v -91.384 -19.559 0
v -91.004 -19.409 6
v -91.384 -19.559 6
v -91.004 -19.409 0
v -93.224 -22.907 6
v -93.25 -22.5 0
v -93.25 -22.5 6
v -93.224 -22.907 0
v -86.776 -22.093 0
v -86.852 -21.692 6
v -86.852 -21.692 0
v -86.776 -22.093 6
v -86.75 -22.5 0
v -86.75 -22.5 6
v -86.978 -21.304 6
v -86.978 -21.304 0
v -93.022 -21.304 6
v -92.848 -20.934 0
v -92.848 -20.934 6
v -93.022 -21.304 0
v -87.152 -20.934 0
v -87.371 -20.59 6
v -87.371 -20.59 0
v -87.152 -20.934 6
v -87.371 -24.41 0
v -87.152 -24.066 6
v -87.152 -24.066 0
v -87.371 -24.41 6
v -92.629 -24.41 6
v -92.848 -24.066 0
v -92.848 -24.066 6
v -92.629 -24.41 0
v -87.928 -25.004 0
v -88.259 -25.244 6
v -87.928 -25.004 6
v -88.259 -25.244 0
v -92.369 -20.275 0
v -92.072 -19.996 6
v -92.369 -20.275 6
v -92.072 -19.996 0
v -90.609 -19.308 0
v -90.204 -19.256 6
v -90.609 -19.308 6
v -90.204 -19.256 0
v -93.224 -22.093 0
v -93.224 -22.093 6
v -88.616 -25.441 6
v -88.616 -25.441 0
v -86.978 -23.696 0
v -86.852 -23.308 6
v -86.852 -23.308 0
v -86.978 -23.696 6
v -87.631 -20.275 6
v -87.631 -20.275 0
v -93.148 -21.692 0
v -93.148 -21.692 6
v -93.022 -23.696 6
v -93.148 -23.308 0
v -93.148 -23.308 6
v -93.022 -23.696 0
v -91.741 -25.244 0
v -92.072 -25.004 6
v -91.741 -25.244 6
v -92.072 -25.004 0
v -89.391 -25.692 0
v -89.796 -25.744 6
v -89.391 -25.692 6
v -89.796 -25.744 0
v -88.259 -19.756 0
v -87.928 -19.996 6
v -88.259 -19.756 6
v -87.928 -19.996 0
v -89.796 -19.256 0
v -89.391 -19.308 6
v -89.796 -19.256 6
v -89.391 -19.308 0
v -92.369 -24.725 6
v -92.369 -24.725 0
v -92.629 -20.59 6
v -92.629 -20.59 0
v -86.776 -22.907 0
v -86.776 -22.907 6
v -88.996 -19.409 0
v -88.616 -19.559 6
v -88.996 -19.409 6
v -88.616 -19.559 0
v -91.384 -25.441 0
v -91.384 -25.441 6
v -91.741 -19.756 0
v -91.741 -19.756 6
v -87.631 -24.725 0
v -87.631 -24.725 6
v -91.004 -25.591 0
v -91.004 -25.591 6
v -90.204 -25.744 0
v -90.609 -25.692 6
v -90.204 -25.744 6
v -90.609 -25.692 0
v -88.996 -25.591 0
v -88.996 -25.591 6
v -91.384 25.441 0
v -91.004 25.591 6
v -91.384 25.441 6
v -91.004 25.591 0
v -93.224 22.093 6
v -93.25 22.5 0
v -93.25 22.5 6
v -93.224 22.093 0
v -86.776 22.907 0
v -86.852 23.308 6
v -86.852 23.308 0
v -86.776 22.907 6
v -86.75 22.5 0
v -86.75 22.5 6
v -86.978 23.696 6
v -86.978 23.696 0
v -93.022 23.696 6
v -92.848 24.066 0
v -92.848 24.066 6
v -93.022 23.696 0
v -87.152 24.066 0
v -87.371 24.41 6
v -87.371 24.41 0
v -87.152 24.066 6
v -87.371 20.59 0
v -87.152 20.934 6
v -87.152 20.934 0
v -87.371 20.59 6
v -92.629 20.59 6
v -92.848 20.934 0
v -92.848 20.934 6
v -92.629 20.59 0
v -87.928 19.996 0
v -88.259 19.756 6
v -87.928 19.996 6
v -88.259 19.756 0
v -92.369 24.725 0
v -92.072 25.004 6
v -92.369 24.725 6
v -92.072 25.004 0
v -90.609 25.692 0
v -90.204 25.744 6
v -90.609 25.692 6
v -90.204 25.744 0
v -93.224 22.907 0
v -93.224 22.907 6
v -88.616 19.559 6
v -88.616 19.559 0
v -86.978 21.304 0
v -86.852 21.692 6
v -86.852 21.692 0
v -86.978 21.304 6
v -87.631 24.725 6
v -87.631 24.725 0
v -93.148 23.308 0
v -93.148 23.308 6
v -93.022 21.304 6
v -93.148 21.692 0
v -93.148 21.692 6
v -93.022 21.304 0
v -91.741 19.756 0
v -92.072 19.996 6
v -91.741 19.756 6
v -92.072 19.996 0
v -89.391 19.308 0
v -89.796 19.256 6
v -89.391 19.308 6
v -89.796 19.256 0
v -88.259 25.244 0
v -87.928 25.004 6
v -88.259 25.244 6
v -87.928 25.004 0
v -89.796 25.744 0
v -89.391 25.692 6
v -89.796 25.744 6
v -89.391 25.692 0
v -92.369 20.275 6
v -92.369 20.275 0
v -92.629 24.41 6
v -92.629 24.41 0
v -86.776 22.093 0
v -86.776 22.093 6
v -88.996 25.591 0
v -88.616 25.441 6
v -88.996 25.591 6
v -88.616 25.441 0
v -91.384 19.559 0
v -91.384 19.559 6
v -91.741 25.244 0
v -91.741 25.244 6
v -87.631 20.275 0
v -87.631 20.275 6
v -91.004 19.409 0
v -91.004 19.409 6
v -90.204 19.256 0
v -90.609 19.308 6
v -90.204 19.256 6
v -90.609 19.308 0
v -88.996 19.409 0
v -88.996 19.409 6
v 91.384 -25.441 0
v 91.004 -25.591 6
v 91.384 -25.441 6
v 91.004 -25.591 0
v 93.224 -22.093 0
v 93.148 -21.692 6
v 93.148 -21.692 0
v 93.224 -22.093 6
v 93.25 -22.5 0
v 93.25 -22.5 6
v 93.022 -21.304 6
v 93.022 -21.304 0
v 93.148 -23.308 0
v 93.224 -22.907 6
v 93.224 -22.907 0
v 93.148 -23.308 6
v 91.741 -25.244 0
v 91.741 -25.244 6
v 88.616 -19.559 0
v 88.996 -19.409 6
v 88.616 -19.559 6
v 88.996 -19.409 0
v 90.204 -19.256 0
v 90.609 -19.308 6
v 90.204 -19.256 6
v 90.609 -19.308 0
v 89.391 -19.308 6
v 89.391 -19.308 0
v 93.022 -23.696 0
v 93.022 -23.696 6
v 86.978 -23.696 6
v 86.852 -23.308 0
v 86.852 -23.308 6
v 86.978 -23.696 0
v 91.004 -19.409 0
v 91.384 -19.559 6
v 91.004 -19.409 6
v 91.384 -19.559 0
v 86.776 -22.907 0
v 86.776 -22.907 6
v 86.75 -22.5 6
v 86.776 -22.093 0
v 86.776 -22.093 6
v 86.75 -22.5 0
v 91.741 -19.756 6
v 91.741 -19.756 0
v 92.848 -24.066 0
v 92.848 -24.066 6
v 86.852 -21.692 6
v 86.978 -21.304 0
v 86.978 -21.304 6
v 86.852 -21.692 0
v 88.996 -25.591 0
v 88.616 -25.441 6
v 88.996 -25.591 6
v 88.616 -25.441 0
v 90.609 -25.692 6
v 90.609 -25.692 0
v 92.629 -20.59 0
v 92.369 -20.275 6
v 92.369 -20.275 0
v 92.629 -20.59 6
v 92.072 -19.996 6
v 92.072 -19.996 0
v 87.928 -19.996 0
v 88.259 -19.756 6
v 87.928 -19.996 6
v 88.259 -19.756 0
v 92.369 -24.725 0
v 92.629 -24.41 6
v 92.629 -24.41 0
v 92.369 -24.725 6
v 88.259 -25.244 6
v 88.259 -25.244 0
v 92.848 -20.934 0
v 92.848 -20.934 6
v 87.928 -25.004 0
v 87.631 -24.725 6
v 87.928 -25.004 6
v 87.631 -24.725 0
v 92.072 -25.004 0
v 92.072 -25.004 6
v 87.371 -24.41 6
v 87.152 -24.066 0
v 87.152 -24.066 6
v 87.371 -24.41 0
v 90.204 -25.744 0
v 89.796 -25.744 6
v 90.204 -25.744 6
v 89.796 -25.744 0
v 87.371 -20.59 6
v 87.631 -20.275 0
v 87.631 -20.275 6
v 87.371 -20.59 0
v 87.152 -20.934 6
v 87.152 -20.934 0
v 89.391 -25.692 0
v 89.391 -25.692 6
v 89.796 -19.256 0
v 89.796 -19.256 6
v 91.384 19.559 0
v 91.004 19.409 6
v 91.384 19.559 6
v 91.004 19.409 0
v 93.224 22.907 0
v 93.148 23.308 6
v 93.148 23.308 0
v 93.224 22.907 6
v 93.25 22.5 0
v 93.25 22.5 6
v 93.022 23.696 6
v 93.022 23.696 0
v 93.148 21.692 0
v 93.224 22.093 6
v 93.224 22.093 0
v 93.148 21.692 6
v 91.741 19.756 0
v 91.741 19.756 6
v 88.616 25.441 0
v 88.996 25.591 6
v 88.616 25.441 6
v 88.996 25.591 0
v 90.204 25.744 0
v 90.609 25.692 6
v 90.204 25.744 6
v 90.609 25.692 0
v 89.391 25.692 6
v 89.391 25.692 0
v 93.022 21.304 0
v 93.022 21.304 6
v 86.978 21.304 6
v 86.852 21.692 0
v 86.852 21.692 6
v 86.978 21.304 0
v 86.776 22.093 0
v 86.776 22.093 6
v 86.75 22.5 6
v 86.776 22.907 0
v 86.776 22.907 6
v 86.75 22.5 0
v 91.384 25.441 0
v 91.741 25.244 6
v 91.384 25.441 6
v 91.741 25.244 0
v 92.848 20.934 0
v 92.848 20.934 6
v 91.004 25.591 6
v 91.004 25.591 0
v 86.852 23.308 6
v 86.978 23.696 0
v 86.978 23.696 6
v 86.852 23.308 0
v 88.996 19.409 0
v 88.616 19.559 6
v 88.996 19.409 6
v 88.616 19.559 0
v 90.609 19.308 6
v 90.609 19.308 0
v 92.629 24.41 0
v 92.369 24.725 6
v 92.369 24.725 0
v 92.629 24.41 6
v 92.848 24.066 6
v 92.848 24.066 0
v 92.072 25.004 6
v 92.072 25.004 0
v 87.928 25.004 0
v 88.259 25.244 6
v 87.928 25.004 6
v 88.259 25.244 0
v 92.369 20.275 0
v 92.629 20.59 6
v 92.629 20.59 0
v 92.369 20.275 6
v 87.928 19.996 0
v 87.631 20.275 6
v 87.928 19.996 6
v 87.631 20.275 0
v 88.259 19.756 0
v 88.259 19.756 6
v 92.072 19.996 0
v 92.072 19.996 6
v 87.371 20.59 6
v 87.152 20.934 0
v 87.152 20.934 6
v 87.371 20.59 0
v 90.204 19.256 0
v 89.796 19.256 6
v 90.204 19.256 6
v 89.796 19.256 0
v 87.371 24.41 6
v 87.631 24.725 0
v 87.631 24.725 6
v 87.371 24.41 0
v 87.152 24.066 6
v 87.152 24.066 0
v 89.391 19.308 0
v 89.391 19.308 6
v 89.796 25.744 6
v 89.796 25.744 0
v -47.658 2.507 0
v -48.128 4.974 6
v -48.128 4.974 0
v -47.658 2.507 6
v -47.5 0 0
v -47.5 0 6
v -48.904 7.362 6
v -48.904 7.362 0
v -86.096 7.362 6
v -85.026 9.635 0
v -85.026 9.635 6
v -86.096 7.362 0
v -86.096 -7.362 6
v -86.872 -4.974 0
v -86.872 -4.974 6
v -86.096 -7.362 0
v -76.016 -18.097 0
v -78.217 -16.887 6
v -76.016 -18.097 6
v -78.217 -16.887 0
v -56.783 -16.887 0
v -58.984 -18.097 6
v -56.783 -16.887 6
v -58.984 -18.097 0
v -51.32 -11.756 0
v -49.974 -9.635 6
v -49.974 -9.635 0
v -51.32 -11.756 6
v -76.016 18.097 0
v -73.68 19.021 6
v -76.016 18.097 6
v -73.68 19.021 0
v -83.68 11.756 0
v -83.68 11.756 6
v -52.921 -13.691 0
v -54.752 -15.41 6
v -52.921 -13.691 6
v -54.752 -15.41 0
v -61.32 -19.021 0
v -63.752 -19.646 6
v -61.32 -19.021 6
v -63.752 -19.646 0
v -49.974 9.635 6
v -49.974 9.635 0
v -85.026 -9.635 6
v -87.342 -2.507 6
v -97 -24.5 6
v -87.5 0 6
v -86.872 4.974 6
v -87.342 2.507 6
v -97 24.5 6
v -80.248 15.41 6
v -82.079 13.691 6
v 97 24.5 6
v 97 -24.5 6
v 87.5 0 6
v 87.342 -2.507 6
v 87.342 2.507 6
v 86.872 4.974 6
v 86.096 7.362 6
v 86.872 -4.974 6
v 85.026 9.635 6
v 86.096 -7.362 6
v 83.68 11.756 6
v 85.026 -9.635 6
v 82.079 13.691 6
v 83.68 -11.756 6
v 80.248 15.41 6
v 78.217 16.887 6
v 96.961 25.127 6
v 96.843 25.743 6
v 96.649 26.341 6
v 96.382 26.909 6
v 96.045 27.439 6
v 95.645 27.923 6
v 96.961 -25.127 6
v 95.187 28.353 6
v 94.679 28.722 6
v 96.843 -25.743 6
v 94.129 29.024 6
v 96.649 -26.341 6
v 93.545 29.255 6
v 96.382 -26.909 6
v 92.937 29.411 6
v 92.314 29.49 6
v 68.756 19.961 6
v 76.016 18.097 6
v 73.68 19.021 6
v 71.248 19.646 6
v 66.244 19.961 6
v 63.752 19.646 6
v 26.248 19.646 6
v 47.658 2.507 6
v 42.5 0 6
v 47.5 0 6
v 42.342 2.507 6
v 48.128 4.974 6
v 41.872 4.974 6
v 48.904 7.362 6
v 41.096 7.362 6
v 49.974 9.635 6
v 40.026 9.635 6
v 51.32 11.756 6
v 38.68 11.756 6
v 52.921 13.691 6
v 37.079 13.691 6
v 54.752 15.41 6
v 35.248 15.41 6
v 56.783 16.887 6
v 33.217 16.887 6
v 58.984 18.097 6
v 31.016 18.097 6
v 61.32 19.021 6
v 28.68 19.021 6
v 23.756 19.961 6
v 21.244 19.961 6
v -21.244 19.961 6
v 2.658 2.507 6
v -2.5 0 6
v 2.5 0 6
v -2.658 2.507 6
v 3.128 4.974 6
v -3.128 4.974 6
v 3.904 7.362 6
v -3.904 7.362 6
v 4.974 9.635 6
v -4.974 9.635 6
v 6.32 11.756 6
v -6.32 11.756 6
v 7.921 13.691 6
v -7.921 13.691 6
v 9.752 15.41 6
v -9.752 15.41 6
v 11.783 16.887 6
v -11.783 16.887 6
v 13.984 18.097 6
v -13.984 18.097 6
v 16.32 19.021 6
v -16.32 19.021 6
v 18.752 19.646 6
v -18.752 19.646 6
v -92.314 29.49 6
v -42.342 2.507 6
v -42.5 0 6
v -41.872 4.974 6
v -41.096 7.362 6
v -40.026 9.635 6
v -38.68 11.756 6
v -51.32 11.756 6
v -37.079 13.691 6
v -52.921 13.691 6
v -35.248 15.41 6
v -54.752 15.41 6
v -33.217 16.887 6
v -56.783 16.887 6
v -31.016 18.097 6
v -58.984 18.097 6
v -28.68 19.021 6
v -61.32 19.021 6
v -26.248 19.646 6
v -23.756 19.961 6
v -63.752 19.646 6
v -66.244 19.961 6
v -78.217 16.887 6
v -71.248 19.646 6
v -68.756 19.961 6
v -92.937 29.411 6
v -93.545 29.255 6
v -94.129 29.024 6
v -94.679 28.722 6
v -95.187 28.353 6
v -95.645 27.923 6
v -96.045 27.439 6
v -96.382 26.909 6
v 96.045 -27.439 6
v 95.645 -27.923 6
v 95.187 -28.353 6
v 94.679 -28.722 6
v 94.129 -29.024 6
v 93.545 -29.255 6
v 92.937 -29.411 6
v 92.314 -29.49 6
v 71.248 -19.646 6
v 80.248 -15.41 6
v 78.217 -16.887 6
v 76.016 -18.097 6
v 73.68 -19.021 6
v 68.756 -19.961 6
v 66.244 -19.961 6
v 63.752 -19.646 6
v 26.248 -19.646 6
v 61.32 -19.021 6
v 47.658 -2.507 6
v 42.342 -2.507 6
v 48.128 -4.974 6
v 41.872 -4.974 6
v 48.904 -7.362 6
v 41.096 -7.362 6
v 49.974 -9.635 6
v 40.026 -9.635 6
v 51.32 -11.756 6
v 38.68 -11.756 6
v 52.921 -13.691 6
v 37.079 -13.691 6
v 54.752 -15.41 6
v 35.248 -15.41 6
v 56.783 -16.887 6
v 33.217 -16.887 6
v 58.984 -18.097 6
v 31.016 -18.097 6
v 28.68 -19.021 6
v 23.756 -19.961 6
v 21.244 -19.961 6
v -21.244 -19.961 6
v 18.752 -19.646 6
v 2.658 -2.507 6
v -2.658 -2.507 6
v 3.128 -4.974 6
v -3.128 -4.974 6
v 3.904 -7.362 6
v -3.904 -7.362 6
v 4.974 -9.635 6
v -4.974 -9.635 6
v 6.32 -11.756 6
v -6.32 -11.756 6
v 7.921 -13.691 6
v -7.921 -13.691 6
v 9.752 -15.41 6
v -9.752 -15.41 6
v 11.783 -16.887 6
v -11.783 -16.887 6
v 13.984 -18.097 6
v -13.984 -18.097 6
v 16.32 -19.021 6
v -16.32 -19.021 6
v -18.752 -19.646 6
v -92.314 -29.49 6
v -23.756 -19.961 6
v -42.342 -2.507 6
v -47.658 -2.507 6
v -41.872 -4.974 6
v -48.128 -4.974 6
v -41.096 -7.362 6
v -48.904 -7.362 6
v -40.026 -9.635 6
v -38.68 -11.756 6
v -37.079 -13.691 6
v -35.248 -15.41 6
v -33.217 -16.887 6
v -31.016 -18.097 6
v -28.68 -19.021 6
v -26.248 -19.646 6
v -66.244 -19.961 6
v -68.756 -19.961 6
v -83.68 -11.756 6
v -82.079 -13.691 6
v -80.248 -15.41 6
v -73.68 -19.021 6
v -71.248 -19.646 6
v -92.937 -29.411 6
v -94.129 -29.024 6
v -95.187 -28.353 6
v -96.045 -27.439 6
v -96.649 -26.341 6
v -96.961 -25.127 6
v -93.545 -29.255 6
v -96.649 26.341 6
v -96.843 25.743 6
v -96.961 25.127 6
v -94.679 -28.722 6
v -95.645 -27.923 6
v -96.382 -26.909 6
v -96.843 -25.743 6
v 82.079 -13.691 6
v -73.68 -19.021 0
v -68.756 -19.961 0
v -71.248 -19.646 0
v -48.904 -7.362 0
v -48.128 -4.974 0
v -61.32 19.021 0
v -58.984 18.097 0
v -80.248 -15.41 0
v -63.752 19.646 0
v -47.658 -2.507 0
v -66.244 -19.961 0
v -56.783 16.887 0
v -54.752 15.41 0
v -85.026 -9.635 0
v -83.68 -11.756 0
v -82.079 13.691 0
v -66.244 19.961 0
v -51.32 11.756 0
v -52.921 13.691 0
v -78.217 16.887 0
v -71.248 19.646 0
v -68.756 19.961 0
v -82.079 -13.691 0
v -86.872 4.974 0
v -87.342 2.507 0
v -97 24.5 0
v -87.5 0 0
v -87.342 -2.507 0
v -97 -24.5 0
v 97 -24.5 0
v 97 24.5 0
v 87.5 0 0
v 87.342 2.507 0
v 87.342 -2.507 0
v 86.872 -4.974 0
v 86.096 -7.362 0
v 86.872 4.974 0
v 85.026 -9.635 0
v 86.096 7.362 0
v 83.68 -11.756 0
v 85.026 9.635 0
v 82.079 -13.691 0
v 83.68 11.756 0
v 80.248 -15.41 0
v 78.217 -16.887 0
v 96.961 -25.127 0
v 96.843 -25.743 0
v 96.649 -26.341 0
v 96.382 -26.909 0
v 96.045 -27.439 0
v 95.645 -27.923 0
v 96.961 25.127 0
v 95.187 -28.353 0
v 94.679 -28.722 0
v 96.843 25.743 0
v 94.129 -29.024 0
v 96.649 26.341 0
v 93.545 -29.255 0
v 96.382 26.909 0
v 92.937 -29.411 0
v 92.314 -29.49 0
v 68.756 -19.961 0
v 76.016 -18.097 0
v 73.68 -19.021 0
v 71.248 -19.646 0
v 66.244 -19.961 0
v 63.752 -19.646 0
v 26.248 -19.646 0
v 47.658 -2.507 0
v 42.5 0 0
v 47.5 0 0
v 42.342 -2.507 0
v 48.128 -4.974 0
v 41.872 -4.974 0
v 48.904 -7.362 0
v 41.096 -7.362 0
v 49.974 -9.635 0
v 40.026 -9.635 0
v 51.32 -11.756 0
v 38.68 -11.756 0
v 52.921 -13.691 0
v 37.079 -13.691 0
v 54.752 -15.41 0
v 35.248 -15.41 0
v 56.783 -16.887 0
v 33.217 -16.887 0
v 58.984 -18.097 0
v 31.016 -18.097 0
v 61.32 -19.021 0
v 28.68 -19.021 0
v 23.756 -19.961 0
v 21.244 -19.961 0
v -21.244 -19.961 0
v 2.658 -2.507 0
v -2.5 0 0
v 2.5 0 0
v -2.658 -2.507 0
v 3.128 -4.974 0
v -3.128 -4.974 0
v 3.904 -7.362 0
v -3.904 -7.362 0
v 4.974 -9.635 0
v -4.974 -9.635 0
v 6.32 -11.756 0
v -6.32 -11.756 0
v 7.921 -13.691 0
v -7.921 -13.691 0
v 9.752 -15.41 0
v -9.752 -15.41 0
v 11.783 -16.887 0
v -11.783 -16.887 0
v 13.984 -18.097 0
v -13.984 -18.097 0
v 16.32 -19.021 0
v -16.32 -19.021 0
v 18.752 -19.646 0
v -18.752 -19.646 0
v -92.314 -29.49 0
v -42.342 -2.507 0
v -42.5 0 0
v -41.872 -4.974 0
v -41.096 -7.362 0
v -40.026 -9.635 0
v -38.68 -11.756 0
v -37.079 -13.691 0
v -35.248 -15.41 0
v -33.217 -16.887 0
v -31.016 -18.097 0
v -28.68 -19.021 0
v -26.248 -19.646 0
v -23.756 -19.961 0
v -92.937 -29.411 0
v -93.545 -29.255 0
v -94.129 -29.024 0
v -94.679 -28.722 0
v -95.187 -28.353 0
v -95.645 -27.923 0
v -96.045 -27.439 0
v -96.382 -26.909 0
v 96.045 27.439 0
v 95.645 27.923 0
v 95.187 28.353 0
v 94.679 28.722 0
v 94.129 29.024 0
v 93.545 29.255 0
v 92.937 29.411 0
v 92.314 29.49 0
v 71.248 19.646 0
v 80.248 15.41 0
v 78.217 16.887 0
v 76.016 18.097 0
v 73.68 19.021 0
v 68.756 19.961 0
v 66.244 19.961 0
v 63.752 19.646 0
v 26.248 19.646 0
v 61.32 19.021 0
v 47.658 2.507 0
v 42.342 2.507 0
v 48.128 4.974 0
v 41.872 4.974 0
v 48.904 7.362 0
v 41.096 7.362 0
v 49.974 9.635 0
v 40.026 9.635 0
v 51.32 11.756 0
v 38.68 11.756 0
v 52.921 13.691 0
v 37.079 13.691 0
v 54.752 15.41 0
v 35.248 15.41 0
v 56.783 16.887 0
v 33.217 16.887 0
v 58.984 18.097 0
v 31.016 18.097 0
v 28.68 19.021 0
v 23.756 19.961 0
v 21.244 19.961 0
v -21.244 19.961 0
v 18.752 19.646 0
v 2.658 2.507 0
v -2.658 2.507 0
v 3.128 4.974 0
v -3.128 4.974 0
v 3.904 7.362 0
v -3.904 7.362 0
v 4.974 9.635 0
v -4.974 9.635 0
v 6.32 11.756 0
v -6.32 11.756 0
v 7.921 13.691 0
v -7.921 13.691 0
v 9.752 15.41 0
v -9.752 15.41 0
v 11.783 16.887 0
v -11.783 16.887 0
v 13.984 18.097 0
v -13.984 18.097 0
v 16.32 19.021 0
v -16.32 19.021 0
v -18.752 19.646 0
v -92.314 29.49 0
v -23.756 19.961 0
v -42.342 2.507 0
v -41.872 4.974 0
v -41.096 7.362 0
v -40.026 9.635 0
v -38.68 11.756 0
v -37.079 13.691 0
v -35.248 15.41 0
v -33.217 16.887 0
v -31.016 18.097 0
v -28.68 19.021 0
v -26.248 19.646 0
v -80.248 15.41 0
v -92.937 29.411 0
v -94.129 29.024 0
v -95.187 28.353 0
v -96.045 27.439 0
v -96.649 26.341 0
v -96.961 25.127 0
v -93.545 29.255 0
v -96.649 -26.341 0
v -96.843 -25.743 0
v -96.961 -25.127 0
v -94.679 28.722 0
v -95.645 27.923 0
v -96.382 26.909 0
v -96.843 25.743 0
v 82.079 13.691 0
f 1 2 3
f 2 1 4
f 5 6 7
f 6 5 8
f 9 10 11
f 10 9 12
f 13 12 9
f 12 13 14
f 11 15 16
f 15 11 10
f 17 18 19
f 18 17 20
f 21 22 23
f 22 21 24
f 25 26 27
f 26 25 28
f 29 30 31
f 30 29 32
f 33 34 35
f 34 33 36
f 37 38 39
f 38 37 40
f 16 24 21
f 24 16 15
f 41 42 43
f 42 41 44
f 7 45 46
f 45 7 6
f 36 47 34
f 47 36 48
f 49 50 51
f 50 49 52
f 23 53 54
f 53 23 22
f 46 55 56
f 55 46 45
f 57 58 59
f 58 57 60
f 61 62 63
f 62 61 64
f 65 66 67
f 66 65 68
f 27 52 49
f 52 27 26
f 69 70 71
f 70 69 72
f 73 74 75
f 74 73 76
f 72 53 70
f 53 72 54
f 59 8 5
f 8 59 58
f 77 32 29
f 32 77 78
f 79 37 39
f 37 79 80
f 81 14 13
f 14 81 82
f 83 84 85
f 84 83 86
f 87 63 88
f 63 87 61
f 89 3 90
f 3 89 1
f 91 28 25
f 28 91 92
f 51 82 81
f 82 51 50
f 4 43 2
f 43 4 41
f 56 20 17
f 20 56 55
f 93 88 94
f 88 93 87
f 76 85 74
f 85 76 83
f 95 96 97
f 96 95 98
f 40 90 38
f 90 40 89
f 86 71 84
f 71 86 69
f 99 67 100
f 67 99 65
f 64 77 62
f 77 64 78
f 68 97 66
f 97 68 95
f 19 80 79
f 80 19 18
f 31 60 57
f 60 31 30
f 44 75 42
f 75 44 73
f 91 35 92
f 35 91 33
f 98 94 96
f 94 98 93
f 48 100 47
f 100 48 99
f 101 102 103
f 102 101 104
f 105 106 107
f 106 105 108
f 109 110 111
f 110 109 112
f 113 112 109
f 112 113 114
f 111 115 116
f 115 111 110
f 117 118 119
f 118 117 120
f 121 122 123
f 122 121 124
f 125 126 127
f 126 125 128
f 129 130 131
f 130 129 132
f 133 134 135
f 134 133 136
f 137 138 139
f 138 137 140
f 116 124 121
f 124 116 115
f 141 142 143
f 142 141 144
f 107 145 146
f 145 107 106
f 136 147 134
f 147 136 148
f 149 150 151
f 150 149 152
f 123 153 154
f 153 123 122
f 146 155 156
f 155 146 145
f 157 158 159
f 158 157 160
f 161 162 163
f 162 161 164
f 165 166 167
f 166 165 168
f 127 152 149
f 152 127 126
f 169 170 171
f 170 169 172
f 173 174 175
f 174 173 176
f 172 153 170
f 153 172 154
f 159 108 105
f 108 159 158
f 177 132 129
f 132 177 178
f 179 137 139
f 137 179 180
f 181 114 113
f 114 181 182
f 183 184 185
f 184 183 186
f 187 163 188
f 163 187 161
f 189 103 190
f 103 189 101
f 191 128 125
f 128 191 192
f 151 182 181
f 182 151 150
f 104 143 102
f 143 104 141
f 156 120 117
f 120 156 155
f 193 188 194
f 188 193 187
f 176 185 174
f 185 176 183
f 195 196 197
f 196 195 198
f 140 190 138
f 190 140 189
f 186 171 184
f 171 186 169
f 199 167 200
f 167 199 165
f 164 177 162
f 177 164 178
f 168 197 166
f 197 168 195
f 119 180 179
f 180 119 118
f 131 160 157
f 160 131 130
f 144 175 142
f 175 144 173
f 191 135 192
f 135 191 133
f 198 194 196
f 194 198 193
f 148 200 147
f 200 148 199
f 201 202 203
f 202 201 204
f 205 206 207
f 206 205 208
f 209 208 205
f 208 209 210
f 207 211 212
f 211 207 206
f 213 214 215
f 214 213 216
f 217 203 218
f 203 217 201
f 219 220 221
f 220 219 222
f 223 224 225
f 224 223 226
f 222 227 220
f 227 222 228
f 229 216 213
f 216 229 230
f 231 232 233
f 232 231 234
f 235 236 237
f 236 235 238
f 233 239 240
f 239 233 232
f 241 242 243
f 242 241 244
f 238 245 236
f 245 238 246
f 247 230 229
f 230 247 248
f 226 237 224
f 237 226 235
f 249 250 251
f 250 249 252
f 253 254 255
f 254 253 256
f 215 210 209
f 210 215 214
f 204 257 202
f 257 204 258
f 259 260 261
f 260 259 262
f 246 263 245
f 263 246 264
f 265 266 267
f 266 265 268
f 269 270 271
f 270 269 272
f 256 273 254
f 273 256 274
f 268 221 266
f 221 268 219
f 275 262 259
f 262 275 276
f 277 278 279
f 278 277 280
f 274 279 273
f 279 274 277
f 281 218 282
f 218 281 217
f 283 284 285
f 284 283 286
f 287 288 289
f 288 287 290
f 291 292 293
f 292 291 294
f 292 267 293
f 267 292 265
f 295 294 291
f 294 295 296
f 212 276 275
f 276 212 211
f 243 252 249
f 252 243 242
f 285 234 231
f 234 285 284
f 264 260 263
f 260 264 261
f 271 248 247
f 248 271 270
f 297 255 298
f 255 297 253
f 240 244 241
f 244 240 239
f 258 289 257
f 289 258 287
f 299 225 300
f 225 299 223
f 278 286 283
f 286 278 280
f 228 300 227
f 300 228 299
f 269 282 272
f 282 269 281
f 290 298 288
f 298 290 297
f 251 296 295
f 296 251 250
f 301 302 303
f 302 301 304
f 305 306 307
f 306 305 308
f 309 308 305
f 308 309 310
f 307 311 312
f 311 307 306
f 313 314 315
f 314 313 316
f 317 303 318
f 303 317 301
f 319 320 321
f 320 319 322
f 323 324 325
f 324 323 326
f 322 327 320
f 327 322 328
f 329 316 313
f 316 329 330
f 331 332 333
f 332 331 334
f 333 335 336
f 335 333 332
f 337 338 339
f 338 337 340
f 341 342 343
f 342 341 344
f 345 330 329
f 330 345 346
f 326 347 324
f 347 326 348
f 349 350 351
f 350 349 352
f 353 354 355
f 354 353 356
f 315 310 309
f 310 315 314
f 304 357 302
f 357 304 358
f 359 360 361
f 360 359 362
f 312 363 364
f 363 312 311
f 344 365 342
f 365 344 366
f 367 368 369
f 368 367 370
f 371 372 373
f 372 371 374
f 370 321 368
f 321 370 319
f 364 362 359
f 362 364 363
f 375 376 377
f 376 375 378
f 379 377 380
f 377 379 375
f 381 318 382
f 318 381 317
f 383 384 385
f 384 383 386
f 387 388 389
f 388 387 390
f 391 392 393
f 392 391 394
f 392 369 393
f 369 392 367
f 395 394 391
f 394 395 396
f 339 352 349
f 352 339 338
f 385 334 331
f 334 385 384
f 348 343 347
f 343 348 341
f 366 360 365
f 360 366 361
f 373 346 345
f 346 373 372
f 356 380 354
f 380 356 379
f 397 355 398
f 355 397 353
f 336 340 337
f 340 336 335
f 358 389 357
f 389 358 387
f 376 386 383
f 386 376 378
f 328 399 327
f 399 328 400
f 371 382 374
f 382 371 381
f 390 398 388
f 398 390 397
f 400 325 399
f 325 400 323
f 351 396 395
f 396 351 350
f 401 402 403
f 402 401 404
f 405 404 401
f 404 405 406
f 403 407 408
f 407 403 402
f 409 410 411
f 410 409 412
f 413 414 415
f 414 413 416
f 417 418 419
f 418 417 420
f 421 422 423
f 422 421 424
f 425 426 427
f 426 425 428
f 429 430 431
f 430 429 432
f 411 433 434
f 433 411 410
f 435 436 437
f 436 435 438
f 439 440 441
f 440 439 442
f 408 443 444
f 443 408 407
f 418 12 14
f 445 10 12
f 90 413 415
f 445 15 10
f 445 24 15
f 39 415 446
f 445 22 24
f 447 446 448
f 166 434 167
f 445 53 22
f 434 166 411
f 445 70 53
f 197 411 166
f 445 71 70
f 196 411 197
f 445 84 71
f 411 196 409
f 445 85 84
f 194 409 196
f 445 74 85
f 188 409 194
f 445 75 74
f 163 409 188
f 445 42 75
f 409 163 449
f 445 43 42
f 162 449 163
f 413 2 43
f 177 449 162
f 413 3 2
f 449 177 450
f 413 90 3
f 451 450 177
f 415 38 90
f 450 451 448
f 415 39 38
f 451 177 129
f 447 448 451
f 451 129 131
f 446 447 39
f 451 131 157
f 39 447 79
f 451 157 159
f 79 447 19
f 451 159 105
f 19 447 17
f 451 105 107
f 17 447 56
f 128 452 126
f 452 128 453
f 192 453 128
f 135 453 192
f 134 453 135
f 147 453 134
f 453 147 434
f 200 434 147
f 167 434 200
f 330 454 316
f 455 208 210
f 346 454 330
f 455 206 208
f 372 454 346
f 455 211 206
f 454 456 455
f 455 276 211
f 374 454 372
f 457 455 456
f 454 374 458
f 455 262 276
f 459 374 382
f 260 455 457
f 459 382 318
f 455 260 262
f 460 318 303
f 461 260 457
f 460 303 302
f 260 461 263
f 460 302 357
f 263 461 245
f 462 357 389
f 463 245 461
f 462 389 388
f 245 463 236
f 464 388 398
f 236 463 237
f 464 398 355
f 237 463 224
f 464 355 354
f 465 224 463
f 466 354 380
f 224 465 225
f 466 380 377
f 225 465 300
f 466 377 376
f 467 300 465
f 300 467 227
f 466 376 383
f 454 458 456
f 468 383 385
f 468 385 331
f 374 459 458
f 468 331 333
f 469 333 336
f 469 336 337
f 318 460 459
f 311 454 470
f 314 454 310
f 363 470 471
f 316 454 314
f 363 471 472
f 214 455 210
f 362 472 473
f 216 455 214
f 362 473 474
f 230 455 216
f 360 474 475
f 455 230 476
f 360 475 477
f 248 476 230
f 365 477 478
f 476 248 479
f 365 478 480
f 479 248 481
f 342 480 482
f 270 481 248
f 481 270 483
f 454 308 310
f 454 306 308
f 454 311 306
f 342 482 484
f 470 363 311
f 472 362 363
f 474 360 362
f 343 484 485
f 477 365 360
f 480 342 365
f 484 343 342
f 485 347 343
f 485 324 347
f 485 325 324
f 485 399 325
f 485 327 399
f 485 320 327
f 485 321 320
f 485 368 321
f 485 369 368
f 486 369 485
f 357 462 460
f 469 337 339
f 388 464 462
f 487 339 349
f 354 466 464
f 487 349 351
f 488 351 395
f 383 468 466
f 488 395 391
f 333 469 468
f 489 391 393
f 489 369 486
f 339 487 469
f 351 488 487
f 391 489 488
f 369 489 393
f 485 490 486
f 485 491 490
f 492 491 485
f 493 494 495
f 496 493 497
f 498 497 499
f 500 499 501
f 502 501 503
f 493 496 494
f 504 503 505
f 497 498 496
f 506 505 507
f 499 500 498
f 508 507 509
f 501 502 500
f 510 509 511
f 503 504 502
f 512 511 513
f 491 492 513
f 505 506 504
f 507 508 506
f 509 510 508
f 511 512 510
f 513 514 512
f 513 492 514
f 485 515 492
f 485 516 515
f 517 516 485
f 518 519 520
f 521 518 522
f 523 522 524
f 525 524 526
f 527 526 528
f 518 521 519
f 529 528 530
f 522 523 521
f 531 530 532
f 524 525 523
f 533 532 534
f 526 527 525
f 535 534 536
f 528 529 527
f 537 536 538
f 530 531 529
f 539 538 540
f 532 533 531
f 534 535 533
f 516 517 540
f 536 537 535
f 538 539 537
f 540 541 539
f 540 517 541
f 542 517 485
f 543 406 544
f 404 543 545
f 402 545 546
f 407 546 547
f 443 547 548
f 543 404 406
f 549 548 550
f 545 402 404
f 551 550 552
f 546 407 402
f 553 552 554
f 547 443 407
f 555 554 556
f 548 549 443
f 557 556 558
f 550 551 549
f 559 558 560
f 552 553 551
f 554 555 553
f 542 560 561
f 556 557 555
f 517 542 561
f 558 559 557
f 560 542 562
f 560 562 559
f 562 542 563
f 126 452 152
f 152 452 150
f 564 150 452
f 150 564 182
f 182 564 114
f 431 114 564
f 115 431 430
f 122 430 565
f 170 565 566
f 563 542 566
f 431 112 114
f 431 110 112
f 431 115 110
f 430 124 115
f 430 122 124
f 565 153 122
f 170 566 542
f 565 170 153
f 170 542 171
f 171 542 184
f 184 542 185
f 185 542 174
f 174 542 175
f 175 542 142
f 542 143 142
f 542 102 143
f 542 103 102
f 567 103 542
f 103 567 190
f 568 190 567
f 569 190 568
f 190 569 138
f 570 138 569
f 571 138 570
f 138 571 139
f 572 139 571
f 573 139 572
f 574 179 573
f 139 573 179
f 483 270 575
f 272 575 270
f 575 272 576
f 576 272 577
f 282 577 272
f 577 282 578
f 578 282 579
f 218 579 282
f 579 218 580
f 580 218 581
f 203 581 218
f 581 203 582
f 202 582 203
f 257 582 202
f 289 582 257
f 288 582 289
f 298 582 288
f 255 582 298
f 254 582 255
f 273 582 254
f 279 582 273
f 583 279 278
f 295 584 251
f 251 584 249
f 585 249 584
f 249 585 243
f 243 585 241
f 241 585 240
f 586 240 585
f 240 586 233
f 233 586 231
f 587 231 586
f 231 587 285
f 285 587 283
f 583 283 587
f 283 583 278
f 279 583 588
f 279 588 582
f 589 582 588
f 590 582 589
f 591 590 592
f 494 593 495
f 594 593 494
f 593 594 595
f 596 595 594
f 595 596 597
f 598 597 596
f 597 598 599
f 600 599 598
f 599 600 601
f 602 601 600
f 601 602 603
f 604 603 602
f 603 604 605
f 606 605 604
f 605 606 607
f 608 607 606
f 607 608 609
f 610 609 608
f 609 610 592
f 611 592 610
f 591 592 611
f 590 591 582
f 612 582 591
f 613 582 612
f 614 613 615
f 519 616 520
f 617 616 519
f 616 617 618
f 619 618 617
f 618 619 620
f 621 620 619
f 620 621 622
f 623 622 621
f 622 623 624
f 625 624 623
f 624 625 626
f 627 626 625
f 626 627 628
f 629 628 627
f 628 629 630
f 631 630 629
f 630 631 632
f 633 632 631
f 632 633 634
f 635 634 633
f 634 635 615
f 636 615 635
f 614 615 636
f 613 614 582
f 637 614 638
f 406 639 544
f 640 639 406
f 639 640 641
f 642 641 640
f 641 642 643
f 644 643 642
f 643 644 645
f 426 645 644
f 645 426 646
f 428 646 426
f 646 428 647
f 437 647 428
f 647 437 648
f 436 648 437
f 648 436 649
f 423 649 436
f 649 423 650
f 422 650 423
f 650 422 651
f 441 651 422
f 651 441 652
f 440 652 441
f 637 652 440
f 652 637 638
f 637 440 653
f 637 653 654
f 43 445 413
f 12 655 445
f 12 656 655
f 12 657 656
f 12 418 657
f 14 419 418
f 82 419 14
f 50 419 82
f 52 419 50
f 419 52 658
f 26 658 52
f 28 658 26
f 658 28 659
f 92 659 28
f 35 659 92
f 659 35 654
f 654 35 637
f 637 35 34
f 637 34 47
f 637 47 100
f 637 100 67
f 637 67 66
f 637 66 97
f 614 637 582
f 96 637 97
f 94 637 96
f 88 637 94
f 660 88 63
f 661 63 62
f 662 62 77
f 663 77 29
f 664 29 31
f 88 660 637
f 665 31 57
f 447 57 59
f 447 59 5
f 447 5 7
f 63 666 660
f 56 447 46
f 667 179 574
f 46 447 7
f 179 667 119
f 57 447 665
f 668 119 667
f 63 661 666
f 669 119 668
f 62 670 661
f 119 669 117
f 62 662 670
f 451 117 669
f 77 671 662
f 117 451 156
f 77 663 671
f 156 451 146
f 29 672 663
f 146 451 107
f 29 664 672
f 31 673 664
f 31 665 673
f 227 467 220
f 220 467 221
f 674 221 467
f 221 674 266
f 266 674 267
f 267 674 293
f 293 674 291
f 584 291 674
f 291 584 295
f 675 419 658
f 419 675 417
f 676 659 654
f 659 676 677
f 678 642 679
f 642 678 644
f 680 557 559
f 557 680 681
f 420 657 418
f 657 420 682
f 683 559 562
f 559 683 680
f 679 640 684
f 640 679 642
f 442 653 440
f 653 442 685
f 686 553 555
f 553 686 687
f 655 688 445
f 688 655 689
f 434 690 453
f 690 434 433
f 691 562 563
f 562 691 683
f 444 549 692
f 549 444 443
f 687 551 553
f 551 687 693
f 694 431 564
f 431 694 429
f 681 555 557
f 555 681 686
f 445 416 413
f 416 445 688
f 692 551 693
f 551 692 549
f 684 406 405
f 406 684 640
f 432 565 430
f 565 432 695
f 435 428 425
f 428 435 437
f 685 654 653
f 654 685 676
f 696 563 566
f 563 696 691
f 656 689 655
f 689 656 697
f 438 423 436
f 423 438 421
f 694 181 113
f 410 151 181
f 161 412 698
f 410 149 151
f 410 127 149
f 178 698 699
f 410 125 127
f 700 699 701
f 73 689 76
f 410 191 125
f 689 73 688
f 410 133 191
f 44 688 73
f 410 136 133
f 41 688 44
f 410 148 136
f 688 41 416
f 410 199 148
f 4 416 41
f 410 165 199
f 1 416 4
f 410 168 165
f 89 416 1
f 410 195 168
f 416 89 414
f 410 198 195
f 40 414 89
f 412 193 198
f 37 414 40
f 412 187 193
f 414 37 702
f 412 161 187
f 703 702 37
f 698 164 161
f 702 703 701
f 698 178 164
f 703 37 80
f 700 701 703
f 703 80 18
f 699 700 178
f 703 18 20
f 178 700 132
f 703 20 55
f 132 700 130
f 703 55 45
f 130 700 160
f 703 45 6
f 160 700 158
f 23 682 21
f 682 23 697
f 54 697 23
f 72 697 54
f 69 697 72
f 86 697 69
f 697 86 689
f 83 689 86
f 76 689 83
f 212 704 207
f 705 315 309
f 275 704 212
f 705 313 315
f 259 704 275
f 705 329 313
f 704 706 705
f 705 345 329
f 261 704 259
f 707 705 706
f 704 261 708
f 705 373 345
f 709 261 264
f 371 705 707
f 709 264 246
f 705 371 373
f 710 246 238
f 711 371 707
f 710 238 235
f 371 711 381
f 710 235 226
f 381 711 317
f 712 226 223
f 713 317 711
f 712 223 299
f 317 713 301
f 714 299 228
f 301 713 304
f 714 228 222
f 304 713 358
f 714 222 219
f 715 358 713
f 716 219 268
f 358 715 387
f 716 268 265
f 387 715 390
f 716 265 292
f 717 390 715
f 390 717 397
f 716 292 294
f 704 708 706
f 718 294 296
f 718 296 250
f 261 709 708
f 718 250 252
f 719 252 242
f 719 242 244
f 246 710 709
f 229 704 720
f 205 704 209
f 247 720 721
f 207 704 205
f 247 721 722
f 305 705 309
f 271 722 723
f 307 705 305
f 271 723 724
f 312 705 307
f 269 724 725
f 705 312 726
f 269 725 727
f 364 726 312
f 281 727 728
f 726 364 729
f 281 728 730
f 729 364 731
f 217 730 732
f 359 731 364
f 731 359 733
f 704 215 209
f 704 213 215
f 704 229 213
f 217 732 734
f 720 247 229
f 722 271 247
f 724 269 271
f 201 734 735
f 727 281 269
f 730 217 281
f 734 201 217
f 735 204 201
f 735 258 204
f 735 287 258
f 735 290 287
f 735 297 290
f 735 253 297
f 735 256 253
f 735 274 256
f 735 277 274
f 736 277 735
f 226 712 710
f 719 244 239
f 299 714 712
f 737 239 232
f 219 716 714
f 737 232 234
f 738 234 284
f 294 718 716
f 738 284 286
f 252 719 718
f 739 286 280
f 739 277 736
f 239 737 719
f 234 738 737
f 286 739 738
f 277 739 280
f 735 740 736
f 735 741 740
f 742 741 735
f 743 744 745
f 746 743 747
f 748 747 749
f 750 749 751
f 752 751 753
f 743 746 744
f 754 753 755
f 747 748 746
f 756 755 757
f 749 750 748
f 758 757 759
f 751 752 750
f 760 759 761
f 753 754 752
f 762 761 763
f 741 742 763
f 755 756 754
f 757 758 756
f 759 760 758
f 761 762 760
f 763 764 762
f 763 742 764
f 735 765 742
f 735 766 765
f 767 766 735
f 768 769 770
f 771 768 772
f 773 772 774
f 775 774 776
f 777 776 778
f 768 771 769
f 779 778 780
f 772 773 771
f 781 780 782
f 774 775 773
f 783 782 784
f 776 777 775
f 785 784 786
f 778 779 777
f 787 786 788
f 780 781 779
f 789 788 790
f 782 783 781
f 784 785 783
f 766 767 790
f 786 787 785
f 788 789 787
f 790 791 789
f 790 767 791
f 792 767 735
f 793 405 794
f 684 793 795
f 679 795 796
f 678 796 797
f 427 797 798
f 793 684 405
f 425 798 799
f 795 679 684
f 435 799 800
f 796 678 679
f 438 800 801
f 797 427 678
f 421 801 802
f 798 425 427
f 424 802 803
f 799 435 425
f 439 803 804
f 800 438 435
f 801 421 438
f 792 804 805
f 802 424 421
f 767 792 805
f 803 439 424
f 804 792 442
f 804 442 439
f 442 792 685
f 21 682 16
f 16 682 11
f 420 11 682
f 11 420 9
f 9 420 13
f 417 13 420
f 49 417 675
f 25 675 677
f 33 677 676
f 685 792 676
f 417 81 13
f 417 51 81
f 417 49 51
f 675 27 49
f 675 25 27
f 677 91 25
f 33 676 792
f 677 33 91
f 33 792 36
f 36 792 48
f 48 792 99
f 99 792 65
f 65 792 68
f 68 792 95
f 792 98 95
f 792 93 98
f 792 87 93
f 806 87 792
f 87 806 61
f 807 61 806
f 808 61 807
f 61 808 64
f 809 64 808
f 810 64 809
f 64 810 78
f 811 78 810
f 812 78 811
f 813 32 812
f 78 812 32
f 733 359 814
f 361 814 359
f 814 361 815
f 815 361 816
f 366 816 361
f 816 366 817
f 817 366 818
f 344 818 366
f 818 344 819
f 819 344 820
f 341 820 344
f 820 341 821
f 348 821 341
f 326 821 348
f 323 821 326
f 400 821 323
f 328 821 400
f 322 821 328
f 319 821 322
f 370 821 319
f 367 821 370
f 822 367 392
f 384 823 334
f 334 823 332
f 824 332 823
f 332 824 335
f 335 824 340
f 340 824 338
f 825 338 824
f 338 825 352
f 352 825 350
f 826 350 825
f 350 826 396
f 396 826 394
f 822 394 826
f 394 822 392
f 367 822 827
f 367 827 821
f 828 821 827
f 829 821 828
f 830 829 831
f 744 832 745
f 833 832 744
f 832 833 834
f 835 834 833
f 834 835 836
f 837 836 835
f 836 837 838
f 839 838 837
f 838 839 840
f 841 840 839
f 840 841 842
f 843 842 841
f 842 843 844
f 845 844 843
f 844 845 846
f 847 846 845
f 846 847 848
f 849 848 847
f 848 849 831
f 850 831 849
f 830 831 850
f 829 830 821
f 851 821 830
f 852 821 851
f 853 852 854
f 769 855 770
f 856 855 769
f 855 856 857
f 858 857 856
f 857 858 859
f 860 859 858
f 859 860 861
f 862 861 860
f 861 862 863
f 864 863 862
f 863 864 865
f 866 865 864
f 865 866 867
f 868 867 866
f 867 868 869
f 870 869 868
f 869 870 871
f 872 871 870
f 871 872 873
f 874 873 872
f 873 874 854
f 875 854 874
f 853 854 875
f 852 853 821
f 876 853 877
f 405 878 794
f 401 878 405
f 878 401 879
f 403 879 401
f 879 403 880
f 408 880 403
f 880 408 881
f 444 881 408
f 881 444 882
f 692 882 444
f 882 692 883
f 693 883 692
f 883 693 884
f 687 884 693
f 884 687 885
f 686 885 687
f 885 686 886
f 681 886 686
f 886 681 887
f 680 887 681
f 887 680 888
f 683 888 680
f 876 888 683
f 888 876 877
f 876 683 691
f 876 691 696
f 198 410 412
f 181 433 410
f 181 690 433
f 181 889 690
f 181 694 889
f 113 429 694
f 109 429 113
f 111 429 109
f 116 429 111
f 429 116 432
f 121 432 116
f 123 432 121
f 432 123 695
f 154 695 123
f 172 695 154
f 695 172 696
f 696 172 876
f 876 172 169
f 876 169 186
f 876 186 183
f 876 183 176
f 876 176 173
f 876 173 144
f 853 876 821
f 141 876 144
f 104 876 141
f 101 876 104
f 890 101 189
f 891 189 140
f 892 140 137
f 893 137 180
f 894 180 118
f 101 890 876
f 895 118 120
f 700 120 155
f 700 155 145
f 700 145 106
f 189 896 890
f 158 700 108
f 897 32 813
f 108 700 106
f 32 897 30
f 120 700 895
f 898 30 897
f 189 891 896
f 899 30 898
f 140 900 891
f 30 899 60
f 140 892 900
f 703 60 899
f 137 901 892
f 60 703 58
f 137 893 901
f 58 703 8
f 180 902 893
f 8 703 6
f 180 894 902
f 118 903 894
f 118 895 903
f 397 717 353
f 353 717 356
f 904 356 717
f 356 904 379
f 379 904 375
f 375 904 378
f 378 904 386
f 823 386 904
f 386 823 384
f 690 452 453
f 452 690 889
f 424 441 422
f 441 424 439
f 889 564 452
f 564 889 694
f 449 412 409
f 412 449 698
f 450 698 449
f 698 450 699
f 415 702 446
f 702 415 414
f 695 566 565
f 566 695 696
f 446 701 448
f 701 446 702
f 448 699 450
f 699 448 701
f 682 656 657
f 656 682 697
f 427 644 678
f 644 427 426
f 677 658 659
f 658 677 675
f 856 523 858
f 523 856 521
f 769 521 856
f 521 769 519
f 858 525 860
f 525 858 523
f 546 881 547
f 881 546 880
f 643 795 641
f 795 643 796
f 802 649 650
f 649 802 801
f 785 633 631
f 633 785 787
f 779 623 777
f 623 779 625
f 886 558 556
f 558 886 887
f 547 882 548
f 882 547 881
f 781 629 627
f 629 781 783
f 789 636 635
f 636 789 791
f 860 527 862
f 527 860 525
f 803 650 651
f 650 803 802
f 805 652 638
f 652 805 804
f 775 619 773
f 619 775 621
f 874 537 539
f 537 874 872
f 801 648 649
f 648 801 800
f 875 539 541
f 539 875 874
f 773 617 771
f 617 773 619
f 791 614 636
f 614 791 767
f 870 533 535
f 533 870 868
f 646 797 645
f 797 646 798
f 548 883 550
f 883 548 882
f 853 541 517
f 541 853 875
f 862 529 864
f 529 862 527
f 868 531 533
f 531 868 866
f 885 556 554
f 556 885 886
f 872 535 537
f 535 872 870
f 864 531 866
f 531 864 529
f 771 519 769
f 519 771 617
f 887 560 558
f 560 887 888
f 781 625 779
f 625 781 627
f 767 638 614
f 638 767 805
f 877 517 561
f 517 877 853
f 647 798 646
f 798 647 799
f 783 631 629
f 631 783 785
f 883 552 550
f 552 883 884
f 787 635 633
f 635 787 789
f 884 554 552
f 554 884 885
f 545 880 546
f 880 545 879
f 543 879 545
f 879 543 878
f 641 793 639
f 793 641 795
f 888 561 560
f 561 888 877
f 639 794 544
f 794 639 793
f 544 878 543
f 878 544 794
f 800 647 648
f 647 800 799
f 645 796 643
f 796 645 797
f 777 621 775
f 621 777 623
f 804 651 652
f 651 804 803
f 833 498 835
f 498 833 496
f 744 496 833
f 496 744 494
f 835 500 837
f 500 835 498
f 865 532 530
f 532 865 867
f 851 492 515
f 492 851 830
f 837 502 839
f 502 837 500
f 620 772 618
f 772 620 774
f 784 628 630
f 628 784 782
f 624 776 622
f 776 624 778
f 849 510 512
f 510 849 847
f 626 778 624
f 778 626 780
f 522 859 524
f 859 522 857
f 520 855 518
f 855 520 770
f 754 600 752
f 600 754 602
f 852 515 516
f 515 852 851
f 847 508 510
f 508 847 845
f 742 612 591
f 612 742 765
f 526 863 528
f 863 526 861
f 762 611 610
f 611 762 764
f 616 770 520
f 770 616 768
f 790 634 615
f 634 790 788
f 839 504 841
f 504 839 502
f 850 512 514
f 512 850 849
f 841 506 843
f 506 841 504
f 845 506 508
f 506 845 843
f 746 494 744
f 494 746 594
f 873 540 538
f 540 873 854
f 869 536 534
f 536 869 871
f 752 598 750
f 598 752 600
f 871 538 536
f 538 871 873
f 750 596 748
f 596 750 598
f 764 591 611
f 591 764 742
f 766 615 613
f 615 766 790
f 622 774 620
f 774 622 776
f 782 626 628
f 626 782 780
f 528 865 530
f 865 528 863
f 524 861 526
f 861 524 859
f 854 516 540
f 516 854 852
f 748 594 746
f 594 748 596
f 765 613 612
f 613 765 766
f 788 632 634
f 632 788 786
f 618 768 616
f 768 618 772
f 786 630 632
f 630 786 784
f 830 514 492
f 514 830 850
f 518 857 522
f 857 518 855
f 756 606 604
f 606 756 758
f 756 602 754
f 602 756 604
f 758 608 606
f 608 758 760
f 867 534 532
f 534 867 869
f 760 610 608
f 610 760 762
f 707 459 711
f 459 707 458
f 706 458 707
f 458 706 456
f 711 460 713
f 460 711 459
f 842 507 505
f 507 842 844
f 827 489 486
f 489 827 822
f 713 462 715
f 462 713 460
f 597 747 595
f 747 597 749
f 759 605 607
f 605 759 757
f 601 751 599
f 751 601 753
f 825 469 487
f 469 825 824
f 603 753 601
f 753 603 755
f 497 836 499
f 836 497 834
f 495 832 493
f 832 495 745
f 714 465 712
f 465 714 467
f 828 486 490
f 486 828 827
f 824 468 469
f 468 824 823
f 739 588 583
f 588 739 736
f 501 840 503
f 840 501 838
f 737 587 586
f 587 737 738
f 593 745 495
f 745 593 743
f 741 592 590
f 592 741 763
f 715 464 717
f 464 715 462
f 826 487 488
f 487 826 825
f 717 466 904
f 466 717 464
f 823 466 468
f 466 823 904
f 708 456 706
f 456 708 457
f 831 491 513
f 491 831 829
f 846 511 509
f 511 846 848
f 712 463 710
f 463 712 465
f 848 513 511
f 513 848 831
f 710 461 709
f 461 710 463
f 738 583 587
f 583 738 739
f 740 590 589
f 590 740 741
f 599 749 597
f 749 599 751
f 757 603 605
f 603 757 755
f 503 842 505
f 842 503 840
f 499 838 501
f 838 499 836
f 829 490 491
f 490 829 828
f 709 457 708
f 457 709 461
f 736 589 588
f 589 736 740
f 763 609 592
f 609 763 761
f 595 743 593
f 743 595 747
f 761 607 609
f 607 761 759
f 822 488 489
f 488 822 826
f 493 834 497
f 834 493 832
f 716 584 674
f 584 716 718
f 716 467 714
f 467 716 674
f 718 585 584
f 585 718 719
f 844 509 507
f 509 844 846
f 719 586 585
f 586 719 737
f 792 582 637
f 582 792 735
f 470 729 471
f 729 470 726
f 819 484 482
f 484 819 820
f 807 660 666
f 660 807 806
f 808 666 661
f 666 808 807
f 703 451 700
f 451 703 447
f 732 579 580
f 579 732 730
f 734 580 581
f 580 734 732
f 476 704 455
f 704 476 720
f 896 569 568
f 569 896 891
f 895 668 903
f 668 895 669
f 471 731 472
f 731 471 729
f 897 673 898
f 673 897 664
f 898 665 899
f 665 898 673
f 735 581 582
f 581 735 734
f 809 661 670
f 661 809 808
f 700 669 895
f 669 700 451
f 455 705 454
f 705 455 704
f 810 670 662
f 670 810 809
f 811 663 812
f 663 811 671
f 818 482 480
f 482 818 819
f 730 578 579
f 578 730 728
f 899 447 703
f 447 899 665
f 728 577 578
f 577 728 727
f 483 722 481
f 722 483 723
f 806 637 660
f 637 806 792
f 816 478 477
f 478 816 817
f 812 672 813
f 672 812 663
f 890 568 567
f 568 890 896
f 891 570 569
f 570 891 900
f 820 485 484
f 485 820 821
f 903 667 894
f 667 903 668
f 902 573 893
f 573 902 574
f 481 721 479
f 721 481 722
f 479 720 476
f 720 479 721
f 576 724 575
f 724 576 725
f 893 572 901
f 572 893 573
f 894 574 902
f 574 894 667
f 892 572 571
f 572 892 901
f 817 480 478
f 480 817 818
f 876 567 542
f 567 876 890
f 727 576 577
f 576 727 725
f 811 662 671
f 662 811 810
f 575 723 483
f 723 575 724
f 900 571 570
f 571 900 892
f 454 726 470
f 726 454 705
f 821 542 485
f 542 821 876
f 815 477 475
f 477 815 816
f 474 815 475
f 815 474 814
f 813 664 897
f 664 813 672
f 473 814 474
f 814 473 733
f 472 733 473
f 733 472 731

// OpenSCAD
$fn = 50;


difference() {
	union() {
		hull() {
			translate(v = [-92.0000000000, 24.5000000000, 0]) {
				cylinder(h = 6, r = 5);
			}
			translate(v = [92.0000000000, 24.5000000000, 0]) {
				cylinder(h = 6, r = 5);
			}
			translate(v = [-92.0000000000, -24.5000000000, 0]) {
				cylinder(h = 6, r = 5);
			}
			translate(v = [92.0000000000, -24.5000000000, 0]) {
				cylinder(h = 6, r = 5);
			}
		}
	}
	union() {
		#translate(v = [-90.0000000000, -22.5000000000, -100.0000000000]) {
			cylinder(h = 200, r = 3.2500000000);
		}
		#translate(v = [-90.0000000000, 22.5000000000, -100.0000000000]) {
			cylinder(h = 200, r = 3.2500000000);
		}
		#translate(v = [90.0000000000, -22.5000000000, -100.0000000000]) {
			cylinder(h = 200, r = 3.2500000000);
		}
		#translate(v = [90.0000000000, 22.5000000000, -100.0000000000]) {
			cylinder(h = 200, r = 3.2500000000);
		}
		#translate(v = [-67.5000000000, 0, 0]) {
			cylinder(h = 6, r = 20.0000000000);
		}
		#translate(v = [-22.5000000000, 0, 0]) {
			cylinder(h = 6, r = 20.0000000000);
		}
		#translate(v = [22.5000000000, 0, 0]) {
			cylinder(h = 6, r = 20.0000000000);
		}
		#translate(v = [67.5000000000, 0, 0]) {
			cylinder(h = 6, r = 20.0000000000);
		}
	}
}
